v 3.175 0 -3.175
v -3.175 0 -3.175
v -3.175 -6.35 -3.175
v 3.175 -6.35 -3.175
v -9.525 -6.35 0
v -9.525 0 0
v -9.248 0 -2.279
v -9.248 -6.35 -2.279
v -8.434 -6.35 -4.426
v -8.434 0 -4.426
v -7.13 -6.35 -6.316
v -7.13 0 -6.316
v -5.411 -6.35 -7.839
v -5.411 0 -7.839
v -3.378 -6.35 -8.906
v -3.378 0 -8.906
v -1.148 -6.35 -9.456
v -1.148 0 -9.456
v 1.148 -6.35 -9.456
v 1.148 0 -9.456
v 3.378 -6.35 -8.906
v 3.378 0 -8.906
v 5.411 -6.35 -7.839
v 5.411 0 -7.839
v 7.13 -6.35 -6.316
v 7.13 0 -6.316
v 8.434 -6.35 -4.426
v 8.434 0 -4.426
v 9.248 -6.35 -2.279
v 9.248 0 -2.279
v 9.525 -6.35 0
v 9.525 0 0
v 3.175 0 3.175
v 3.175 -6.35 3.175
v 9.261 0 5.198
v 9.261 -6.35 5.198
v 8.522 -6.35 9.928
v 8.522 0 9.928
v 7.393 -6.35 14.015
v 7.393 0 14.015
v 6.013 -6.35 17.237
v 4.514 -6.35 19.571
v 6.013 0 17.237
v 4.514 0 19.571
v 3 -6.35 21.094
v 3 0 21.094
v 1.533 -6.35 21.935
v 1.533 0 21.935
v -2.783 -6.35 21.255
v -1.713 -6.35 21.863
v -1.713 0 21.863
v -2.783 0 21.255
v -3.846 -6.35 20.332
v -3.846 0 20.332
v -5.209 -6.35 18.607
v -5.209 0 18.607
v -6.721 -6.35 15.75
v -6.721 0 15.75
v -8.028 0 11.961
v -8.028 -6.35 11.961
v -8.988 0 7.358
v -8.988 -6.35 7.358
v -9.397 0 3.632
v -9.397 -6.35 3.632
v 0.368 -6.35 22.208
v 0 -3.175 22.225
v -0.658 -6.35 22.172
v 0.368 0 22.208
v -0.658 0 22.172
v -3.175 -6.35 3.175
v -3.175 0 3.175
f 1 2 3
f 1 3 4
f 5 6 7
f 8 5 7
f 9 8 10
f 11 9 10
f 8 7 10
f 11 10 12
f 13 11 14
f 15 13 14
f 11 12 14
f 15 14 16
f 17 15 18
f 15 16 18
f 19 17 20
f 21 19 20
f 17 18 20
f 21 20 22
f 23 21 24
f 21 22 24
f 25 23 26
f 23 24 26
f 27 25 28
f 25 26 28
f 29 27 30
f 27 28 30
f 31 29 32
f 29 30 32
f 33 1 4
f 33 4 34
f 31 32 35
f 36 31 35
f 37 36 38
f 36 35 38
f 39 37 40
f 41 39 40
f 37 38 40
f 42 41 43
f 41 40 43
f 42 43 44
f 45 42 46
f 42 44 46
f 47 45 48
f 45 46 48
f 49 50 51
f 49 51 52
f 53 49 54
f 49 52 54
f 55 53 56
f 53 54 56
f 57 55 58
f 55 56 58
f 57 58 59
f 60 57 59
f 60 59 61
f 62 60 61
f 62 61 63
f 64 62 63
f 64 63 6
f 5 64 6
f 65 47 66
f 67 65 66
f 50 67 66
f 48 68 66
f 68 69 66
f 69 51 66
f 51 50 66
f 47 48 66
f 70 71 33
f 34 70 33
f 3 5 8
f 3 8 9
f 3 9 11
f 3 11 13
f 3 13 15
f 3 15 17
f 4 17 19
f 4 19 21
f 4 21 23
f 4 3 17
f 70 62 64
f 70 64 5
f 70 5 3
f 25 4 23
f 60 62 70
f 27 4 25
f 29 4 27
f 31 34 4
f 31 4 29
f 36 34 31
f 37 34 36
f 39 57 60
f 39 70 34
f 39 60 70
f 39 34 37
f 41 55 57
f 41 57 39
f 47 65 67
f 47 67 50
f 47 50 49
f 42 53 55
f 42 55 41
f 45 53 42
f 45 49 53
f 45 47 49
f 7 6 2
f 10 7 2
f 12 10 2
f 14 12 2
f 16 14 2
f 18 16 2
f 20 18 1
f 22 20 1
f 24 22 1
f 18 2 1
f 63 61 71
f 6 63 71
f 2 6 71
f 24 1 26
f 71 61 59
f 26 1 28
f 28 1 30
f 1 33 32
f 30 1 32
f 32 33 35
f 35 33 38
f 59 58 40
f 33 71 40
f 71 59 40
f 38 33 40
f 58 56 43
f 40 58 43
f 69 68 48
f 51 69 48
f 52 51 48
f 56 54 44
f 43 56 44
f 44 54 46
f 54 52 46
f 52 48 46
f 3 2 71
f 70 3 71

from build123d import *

# Parameters (mm, degrees)
F0_W     = 6.35
F0_H     = 6.35
F1_DEPTH = 6.35


with BuildPart() as f1:
    # F0 (on Front) → F1 (new body)
    with BuildSketch(Plane.XZ):
        with BuildLine():
            ThreePointArc((-9.525, -5.16e-08), (2.58e-08, -9.525), (9.525, 0))
            ThreePointArc((9.525, 0), (-2.58e-08, 9.525), (-9.525, -5.16e-08))
        make_face()
        Rectangle(F0_W, F0_H, mode=Mode.SUBTRACT)
        with BuildLine():
            ThreePointArc((-9.525, -5.16e-08), (-2.58e-08, 9.525), (9.525, 0))
            add(Edge.make_bspline(
                [(9.525, 0), (9.525, 22.2250000258), (-1.11e-08, 22.225), (-9.5250000221, 22.2249999742), (-9.525, -5.16e-08)],
                knots=[1.5707963268, 1.5707963268, 1.5707963268, 3.1415926548, 3.1415926548, 4.7123889827, 4.7123889827, 4.7123889827], degree=2, weights=[1, 0.7071067808, 1, 0.7071067808, 1]))
        make_face()
    extrude(amount=F1_DEPTH)


solid = f1.part
